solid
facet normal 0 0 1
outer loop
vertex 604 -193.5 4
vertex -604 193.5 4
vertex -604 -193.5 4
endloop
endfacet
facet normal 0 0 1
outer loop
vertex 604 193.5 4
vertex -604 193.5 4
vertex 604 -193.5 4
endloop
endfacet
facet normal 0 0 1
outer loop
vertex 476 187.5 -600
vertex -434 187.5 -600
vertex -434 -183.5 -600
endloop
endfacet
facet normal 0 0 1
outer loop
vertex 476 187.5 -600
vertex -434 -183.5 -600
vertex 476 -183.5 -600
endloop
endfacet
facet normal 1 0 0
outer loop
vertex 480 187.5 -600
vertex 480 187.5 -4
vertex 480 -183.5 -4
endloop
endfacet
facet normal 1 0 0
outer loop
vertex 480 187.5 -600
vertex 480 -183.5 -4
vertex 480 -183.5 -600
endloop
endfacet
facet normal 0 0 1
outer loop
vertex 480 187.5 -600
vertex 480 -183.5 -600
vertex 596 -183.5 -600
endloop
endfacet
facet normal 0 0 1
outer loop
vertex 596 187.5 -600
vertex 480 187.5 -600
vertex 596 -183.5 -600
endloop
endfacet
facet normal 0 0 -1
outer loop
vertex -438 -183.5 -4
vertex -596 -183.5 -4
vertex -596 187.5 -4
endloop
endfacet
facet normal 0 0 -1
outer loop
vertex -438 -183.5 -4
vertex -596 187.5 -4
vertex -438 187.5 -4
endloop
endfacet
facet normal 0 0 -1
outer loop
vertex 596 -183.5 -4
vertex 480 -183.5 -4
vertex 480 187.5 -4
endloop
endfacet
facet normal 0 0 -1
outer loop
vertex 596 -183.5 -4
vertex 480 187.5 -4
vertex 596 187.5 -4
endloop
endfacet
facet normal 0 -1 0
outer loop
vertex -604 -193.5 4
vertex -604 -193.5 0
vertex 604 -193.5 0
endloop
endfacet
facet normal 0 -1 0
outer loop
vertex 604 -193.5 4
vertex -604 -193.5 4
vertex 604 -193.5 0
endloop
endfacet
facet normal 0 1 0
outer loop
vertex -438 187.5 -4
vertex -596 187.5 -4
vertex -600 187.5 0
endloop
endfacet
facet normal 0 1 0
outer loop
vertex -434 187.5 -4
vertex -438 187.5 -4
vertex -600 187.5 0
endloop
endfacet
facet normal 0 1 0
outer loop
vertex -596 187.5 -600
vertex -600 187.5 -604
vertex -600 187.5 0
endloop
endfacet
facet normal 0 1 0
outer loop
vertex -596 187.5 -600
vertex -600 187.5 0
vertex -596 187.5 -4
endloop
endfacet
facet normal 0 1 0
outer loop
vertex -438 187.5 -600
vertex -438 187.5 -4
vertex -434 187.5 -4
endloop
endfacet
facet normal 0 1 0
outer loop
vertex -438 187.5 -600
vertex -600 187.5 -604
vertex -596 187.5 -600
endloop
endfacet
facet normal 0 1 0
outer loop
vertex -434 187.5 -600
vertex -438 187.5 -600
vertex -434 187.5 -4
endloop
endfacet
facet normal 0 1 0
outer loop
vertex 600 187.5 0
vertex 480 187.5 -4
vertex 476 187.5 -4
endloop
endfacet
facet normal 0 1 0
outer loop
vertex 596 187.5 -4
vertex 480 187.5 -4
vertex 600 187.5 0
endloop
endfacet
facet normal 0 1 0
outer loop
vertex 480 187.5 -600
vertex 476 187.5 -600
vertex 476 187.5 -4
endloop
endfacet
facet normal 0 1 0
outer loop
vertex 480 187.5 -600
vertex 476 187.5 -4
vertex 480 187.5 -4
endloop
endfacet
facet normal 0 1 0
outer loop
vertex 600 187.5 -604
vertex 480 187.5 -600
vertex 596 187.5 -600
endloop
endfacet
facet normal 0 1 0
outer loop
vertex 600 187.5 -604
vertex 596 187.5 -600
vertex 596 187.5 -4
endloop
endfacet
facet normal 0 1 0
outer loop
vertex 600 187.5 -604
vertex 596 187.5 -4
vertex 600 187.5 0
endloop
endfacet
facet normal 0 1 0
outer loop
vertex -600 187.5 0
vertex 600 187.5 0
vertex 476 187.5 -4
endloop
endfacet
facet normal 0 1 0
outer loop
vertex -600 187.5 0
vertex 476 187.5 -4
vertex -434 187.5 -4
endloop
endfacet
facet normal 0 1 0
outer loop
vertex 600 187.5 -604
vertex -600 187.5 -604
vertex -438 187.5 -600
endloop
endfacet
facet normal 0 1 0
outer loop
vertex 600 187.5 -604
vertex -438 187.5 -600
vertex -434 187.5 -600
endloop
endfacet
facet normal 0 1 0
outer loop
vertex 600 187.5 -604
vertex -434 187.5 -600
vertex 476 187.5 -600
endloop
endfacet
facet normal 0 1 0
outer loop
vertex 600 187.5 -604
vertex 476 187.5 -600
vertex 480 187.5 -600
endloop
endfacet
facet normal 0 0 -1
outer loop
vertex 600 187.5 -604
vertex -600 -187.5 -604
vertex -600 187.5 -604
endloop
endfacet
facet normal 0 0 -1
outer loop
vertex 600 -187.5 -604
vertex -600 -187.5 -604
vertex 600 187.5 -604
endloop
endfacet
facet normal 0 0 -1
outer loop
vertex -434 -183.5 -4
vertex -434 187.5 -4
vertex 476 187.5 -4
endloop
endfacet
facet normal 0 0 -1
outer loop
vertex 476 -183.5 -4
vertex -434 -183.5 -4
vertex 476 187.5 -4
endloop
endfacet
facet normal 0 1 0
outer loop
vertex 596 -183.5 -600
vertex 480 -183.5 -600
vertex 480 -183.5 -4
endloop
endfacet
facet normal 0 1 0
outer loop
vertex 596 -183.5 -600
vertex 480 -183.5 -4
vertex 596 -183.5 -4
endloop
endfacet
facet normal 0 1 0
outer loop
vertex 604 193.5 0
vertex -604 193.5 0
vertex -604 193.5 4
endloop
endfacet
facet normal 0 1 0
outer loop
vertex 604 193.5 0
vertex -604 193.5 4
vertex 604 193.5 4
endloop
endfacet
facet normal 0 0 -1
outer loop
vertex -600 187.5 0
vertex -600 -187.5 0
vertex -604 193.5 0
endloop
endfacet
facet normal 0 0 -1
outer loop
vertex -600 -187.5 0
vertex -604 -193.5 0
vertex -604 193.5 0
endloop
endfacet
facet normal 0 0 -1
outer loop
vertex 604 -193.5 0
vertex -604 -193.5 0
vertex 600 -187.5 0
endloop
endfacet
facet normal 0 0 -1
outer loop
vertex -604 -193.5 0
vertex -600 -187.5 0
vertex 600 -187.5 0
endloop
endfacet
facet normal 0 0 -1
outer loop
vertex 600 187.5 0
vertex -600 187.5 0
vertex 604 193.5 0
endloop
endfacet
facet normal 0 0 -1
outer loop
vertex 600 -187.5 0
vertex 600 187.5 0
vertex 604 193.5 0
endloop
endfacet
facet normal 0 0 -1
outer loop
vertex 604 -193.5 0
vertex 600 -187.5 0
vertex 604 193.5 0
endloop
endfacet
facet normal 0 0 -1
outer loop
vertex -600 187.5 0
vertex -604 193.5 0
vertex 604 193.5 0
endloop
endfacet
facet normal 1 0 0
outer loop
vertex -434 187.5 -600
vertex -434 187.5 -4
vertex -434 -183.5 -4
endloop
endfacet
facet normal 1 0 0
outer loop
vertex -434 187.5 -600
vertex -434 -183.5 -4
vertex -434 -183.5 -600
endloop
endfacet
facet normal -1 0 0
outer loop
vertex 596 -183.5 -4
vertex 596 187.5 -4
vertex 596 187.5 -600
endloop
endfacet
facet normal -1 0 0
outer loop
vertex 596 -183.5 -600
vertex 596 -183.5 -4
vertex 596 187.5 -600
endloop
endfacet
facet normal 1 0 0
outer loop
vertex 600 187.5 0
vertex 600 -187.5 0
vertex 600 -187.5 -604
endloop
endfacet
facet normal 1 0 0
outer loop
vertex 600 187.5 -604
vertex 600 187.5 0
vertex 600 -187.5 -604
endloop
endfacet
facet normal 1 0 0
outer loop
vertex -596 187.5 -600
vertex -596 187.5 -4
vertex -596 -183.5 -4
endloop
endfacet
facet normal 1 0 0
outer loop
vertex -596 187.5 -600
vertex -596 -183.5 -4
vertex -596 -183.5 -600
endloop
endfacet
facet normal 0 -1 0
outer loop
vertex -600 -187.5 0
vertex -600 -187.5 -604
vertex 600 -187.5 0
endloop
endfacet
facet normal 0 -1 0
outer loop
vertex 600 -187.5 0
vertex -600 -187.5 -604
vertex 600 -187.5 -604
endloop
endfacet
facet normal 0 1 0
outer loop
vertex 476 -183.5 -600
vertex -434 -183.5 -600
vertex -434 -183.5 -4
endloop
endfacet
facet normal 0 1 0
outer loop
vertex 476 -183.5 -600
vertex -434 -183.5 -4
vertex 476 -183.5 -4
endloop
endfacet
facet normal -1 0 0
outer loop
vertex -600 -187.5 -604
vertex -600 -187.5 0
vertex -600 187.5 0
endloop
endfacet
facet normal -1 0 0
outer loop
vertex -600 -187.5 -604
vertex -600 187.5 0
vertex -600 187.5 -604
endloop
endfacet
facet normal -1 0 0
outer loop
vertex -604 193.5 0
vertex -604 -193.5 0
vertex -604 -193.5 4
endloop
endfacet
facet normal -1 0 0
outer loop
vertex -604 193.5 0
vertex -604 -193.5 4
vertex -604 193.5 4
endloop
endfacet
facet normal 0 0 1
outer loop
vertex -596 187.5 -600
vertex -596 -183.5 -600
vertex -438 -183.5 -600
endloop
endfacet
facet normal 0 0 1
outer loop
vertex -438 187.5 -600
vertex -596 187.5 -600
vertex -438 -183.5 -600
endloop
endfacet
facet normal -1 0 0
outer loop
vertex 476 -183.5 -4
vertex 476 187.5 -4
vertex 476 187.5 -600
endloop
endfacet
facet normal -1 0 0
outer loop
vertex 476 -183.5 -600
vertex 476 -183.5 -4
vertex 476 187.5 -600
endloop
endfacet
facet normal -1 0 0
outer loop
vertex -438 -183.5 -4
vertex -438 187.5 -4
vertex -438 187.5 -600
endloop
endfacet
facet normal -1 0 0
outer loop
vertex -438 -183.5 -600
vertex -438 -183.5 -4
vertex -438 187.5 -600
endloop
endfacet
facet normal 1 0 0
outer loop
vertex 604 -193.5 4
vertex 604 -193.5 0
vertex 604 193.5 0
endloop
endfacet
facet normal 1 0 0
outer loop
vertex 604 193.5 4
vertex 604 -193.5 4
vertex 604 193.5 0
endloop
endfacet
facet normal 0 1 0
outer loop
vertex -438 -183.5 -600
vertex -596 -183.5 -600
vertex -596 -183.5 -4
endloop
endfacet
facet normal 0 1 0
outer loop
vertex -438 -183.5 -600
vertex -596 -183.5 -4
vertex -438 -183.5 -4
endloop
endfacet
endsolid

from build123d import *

# Parameters (mm, degrees)
SKETCH1_W           = 1208
SKETCH1_H           = 387
BOSS_EXTRUDE1_DEPTH = 4
SKETCH2_W           = 1200
SKETCH2_H           = 604
BOSS_EXTRUDE2_DEPTH = 375
SKETCH3_W           = 158
SKETCH3_H           = 596
SKETCH3_W_2         = 910
SKETCH3_W_3         = 116
CUT_EXTRUDE1_DEPTH  = 371


with BuildPart() as part:
    # Sketch1 → Boss-Extrude1 (new body)
    with BuildSketch(Plane.XY):
        Rectangle(SKETCH1_W, SKETCH1_H)
    extrude(amount=BOSS_EXTRUDE1_DEPTH)

    # Sketch2 → Boss-Extrude2 (add)
    with BuildSketch(Plane(origin=(0, -187.5, 0), x_dir=(1, 0, 0), z_dir=(0, 1, 0))):
        with Locations((0, 302)):
            Rectangle(SKETCH2_W, SKETCH2_H)
    extrude(amount=BOSS_EXTRUDE2_DEPTH)

    # Sketch3 → Cut-Extrude1 (cut)
    with BuildSketch(Plane(origin=(0, 187.5, 0), x_dir=(1, 0, 0), z_dir=(0, 1, 0))):
        with Locations((-517, 302)):
            Rectangle(SKETCH3_W, SKETCH3_H)
        with Locations((21, 302)):
            Rectangle(SKETCH3_W_2, SKETCH3_H)
        with Locations((538, 302)):
            Rectangle(SKETCH3_W_3, SKETCH3_H)
    extrude(amount=-CUT_EXTRUDE1_DEPTH, mode=Mode.SUBTRACT)


solid = part.part
